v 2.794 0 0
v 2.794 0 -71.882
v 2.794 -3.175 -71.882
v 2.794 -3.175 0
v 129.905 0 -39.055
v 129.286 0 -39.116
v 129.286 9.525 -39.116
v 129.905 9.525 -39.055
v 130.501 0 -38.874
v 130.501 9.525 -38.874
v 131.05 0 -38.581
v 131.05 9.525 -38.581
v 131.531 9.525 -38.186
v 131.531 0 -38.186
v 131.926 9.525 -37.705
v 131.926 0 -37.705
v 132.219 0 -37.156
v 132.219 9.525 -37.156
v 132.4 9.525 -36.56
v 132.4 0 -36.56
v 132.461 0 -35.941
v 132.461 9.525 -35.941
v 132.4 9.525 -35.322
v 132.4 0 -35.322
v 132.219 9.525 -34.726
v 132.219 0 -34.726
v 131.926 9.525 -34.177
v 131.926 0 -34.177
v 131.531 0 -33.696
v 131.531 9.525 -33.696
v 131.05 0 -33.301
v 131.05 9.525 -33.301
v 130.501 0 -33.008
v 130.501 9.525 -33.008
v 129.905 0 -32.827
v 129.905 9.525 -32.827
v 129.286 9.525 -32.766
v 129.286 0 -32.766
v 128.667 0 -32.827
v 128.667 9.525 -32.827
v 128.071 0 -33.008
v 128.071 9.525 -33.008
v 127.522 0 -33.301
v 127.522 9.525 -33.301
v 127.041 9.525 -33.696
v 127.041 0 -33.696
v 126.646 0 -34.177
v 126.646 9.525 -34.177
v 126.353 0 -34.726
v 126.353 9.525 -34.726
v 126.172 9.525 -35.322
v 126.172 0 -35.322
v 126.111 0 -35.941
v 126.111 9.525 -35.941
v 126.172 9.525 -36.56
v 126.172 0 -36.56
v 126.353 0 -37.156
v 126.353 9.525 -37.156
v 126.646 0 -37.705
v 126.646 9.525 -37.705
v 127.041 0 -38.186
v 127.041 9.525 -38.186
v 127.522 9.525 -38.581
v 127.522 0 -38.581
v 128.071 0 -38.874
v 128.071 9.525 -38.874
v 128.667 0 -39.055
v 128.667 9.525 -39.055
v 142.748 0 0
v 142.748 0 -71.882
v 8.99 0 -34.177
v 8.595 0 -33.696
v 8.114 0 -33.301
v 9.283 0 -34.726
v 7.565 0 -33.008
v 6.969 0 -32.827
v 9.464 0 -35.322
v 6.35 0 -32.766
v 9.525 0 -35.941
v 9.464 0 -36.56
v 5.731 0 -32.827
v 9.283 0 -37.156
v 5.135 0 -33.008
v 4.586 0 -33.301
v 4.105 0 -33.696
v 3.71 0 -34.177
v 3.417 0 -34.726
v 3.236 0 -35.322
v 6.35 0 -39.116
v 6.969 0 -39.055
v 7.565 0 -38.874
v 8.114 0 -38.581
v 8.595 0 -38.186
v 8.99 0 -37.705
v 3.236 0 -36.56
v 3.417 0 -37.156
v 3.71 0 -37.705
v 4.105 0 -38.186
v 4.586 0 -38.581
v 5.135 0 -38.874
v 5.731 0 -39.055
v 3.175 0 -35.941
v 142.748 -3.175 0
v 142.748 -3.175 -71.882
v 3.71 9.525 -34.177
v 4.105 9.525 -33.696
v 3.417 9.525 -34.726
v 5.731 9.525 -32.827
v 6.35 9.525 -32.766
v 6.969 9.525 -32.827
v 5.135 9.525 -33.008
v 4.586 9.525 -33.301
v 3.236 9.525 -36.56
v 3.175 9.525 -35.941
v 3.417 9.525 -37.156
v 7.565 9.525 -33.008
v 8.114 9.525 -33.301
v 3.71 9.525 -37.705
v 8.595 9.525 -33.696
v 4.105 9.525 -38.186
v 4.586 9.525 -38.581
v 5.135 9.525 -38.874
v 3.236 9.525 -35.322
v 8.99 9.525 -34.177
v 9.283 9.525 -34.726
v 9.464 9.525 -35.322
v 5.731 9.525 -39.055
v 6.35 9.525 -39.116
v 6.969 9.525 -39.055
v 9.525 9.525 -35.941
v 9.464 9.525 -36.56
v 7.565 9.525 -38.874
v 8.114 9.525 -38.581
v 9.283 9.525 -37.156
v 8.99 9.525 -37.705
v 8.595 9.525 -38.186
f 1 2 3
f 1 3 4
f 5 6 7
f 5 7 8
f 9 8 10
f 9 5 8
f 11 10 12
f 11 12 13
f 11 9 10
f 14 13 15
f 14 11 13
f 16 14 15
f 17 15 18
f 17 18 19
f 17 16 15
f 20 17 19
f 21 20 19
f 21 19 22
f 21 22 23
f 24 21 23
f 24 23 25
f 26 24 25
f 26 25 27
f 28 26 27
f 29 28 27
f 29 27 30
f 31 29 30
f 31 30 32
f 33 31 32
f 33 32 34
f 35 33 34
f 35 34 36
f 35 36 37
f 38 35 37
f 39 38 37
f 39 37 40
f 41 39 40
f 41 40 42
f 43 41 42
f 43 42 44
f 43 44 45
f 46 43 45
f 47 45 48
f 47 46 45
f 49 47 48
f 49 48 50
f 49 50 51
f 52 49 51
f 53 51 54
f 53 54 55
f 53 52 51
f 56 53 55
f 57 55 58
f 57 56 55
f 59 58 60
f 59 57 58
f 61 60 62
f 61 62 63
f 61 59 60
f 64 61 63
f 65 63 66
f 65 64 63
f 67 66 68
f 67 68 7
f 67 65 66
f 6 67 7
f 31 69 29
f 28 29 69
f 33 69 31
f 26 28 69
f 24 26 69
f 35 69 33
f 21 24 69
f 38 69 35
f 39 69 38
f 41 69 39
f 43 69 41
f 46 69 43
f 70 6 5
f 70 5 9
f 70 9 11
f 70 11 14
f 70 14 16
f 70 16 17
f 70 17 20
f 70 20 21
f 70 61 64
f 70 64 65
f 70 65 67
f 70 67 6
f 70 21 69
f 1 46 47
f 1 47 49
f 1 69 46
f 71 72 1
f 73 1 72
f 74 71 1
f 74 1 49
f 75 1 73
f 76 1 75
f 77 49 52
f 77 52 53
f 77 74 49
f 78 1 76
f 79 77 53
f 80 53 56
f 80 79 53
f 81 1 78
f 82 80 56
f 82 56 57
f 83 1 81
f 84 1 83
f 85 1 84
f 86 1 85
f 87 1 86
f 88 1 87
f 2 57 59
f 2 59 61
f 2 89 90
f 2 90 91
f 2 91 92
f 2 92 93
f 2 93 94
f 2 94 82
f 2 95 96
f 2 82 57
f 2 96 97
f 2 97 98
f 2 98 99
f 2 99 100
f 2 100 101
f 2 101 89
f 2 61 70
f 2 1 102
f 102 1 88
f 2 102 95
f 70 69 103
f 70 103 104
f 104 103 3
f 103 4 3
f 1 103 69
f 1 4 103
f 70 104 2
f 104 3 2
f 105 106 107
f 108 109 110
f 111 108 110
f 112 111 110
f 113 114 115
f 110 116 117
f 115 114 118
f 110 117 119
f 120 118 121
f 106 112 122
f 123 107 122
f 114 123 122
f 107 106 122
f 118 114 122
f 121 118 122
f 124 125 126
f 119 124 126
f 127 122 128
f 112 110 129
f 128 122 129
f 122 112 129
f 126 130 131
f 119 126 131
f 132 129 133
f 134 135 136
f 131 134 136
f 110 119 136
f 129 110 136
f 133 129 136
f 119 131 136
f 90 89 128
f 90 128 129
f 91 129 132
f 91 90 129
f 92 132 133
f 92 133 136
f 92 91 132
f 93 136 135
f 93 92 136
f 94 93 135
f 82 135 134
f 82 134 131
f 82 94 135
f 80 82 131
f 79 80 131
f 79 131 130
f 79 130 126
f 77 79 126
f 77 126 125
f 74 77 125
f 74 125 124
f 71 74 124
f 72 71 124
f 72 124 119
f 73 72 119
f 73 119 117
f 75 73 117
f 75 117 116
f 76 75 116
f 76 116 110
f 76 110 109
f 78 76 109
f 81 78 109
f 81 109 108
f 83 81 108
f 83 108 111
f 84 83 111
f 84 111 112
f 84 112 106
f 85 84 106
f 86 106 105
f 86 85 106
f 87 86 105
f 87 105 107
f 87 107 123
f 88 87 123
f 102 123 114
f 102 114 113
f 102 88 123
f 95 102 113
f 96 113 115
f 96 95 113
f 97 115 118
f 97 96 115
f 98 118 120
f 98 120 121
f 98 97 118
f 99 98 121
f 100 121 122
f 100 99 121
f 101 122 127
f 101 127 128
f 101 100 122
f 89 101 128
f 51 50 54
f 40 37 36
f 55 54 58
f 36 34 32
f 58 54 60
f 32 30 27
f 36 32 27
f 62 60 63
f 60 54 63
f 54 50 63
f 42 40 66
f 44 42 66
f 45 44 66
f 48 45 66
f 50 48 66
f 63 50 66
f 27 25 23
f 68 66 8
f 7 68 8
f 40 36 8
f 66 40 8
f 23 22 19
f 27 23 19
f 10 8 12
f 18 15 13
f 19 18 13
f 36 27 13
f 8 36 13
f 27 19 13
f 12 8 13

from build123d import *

# Parameters (mm, degrees)
SKETCH1_W             = 139.954
SKETCH1_H             = 71.882
SKETCH1_R             = 4.191
BOSS_EXTRUDE1_DEPTH   = 3.175
SKETCH2_R             = 3.175
BOSS_EXTRUDE4_DEPTH   = 12.7
BOSS_EXTRUDE4_2_DEPTH = 12.7
SKETCH1_7_R           = 4.191
BOSS_EXTRUDE5_DEPTH   = 3.175
BOSS_EXTRUDE6_START   = -3.175
SKETCH14_R            = 4.191
BOSS_EXTRUDE6_DEPTH   = 3.175
SKETCH15_W            = 71.882
SKETCH15_H            = 3.175
CUT_EXTRUDE1_DEPTH    = 2.794
SKETCH16_W            = 71.882
SKETCH16_H            = 3.175
BOSS_EXTRUDE7_DEPTH   = 2.794


with BuildPart() as part:
    # Sketch1 → Boss-Extrude1 (new body)
    with BuildSketch(Plane(origin=(0, 0, 0), x_dir=(1, 0, 0), z_dir=(0, 1, 0))):
        with Locations((69.977, 35.941)):
            Rectangle(SKETCH1_W, SKETCH1_H)
        with Locations((6.35, 35.941)):
            Circle(SKETCH1_R, mode=Mode.SUBTRACT)
        with Locations((129.286, 35.941)):
            Circle(SKETCH1_R, mode=Mode.SUBTRACT)
    extrude(amount=-BOSS_EXTRUDE1_DEPTH)



with BuildPart() as body_2:
    # Sketch2 → Boss-Extrude4 (new body)
    with BuildSketch(Plane.XZ.offset(3.175)):
        with Locations((6.35, -35.941)):
            Circle(SKETCH2_R)
    extrude(amount=-BOSS_EXTRUDE4_DEPTH)


with BuildPart() as body_3:
    # Sketch2 → Boss-Extrude4 2 (new body)
    with BuildSketch(Plane.XZ.offset(3.175)):
        with Locations((129.286, -35.941)):
            Circle(SKETCH2_R)
    extrude(amount=-BOSS_EXTRUDE4_2_DEPTH)


with BuildPart() as part_1:
    add(part.part)

    add(body_3.part)  # Boss-Extrude5 merges body 3
    # Sketch1<7> → Boss-Extrude5 (add)
    with BuildSketch(Plane(origin=(0, 0, 0), x_dir=(1, 0, 0), z_dir=(0, 1, 0))):
        with Locations((129.286, 35.941)):
            Circle(SKETCH1_7_R)
    extrude(amount=-BOSS_EXTRUDE5_DEPTH)


    add(body_2.part)  # Boss-Extrude6 merges body 2
    # Sketch14 → Boss-Extrude6 (add)
    with BuildSketch(Plane.XZ.offset(3.175).offset(BOSS_EXTRUDE6_START)):
        with Locations((6.35, -35.941)):
            Circle(SKETCH14_R)
    extrude(amount=BOSS_EXTRUDE6_DEPTH)

    # Sketch15 → Cut-Extrude1 (cut)
    with BuildSketch(Plane.ZY):
        with Locations((-35.941, -1.5875)):
            Rectangle(SKETCH15_W, SKETCH15_H)
    extrude(amount=-CUT_EXTRUDE1_DEPTH, mode=Mode.SUBTRACT)

    # Sketch16 → Boss-Extrude7 (add)
    with BuildSketch(Plane(origin=(139.954, 0, 0), x_dir=(0, 0, -1), z_dir=(1, 0, 0))):
        with Locations((35.941, -1.5875)):
            Rectangle(SKETCH16_W, SKETCH16_H)
    extrude(amount=BOSS_EXTRUDE7_DEPTH)


solid = part_1.part
